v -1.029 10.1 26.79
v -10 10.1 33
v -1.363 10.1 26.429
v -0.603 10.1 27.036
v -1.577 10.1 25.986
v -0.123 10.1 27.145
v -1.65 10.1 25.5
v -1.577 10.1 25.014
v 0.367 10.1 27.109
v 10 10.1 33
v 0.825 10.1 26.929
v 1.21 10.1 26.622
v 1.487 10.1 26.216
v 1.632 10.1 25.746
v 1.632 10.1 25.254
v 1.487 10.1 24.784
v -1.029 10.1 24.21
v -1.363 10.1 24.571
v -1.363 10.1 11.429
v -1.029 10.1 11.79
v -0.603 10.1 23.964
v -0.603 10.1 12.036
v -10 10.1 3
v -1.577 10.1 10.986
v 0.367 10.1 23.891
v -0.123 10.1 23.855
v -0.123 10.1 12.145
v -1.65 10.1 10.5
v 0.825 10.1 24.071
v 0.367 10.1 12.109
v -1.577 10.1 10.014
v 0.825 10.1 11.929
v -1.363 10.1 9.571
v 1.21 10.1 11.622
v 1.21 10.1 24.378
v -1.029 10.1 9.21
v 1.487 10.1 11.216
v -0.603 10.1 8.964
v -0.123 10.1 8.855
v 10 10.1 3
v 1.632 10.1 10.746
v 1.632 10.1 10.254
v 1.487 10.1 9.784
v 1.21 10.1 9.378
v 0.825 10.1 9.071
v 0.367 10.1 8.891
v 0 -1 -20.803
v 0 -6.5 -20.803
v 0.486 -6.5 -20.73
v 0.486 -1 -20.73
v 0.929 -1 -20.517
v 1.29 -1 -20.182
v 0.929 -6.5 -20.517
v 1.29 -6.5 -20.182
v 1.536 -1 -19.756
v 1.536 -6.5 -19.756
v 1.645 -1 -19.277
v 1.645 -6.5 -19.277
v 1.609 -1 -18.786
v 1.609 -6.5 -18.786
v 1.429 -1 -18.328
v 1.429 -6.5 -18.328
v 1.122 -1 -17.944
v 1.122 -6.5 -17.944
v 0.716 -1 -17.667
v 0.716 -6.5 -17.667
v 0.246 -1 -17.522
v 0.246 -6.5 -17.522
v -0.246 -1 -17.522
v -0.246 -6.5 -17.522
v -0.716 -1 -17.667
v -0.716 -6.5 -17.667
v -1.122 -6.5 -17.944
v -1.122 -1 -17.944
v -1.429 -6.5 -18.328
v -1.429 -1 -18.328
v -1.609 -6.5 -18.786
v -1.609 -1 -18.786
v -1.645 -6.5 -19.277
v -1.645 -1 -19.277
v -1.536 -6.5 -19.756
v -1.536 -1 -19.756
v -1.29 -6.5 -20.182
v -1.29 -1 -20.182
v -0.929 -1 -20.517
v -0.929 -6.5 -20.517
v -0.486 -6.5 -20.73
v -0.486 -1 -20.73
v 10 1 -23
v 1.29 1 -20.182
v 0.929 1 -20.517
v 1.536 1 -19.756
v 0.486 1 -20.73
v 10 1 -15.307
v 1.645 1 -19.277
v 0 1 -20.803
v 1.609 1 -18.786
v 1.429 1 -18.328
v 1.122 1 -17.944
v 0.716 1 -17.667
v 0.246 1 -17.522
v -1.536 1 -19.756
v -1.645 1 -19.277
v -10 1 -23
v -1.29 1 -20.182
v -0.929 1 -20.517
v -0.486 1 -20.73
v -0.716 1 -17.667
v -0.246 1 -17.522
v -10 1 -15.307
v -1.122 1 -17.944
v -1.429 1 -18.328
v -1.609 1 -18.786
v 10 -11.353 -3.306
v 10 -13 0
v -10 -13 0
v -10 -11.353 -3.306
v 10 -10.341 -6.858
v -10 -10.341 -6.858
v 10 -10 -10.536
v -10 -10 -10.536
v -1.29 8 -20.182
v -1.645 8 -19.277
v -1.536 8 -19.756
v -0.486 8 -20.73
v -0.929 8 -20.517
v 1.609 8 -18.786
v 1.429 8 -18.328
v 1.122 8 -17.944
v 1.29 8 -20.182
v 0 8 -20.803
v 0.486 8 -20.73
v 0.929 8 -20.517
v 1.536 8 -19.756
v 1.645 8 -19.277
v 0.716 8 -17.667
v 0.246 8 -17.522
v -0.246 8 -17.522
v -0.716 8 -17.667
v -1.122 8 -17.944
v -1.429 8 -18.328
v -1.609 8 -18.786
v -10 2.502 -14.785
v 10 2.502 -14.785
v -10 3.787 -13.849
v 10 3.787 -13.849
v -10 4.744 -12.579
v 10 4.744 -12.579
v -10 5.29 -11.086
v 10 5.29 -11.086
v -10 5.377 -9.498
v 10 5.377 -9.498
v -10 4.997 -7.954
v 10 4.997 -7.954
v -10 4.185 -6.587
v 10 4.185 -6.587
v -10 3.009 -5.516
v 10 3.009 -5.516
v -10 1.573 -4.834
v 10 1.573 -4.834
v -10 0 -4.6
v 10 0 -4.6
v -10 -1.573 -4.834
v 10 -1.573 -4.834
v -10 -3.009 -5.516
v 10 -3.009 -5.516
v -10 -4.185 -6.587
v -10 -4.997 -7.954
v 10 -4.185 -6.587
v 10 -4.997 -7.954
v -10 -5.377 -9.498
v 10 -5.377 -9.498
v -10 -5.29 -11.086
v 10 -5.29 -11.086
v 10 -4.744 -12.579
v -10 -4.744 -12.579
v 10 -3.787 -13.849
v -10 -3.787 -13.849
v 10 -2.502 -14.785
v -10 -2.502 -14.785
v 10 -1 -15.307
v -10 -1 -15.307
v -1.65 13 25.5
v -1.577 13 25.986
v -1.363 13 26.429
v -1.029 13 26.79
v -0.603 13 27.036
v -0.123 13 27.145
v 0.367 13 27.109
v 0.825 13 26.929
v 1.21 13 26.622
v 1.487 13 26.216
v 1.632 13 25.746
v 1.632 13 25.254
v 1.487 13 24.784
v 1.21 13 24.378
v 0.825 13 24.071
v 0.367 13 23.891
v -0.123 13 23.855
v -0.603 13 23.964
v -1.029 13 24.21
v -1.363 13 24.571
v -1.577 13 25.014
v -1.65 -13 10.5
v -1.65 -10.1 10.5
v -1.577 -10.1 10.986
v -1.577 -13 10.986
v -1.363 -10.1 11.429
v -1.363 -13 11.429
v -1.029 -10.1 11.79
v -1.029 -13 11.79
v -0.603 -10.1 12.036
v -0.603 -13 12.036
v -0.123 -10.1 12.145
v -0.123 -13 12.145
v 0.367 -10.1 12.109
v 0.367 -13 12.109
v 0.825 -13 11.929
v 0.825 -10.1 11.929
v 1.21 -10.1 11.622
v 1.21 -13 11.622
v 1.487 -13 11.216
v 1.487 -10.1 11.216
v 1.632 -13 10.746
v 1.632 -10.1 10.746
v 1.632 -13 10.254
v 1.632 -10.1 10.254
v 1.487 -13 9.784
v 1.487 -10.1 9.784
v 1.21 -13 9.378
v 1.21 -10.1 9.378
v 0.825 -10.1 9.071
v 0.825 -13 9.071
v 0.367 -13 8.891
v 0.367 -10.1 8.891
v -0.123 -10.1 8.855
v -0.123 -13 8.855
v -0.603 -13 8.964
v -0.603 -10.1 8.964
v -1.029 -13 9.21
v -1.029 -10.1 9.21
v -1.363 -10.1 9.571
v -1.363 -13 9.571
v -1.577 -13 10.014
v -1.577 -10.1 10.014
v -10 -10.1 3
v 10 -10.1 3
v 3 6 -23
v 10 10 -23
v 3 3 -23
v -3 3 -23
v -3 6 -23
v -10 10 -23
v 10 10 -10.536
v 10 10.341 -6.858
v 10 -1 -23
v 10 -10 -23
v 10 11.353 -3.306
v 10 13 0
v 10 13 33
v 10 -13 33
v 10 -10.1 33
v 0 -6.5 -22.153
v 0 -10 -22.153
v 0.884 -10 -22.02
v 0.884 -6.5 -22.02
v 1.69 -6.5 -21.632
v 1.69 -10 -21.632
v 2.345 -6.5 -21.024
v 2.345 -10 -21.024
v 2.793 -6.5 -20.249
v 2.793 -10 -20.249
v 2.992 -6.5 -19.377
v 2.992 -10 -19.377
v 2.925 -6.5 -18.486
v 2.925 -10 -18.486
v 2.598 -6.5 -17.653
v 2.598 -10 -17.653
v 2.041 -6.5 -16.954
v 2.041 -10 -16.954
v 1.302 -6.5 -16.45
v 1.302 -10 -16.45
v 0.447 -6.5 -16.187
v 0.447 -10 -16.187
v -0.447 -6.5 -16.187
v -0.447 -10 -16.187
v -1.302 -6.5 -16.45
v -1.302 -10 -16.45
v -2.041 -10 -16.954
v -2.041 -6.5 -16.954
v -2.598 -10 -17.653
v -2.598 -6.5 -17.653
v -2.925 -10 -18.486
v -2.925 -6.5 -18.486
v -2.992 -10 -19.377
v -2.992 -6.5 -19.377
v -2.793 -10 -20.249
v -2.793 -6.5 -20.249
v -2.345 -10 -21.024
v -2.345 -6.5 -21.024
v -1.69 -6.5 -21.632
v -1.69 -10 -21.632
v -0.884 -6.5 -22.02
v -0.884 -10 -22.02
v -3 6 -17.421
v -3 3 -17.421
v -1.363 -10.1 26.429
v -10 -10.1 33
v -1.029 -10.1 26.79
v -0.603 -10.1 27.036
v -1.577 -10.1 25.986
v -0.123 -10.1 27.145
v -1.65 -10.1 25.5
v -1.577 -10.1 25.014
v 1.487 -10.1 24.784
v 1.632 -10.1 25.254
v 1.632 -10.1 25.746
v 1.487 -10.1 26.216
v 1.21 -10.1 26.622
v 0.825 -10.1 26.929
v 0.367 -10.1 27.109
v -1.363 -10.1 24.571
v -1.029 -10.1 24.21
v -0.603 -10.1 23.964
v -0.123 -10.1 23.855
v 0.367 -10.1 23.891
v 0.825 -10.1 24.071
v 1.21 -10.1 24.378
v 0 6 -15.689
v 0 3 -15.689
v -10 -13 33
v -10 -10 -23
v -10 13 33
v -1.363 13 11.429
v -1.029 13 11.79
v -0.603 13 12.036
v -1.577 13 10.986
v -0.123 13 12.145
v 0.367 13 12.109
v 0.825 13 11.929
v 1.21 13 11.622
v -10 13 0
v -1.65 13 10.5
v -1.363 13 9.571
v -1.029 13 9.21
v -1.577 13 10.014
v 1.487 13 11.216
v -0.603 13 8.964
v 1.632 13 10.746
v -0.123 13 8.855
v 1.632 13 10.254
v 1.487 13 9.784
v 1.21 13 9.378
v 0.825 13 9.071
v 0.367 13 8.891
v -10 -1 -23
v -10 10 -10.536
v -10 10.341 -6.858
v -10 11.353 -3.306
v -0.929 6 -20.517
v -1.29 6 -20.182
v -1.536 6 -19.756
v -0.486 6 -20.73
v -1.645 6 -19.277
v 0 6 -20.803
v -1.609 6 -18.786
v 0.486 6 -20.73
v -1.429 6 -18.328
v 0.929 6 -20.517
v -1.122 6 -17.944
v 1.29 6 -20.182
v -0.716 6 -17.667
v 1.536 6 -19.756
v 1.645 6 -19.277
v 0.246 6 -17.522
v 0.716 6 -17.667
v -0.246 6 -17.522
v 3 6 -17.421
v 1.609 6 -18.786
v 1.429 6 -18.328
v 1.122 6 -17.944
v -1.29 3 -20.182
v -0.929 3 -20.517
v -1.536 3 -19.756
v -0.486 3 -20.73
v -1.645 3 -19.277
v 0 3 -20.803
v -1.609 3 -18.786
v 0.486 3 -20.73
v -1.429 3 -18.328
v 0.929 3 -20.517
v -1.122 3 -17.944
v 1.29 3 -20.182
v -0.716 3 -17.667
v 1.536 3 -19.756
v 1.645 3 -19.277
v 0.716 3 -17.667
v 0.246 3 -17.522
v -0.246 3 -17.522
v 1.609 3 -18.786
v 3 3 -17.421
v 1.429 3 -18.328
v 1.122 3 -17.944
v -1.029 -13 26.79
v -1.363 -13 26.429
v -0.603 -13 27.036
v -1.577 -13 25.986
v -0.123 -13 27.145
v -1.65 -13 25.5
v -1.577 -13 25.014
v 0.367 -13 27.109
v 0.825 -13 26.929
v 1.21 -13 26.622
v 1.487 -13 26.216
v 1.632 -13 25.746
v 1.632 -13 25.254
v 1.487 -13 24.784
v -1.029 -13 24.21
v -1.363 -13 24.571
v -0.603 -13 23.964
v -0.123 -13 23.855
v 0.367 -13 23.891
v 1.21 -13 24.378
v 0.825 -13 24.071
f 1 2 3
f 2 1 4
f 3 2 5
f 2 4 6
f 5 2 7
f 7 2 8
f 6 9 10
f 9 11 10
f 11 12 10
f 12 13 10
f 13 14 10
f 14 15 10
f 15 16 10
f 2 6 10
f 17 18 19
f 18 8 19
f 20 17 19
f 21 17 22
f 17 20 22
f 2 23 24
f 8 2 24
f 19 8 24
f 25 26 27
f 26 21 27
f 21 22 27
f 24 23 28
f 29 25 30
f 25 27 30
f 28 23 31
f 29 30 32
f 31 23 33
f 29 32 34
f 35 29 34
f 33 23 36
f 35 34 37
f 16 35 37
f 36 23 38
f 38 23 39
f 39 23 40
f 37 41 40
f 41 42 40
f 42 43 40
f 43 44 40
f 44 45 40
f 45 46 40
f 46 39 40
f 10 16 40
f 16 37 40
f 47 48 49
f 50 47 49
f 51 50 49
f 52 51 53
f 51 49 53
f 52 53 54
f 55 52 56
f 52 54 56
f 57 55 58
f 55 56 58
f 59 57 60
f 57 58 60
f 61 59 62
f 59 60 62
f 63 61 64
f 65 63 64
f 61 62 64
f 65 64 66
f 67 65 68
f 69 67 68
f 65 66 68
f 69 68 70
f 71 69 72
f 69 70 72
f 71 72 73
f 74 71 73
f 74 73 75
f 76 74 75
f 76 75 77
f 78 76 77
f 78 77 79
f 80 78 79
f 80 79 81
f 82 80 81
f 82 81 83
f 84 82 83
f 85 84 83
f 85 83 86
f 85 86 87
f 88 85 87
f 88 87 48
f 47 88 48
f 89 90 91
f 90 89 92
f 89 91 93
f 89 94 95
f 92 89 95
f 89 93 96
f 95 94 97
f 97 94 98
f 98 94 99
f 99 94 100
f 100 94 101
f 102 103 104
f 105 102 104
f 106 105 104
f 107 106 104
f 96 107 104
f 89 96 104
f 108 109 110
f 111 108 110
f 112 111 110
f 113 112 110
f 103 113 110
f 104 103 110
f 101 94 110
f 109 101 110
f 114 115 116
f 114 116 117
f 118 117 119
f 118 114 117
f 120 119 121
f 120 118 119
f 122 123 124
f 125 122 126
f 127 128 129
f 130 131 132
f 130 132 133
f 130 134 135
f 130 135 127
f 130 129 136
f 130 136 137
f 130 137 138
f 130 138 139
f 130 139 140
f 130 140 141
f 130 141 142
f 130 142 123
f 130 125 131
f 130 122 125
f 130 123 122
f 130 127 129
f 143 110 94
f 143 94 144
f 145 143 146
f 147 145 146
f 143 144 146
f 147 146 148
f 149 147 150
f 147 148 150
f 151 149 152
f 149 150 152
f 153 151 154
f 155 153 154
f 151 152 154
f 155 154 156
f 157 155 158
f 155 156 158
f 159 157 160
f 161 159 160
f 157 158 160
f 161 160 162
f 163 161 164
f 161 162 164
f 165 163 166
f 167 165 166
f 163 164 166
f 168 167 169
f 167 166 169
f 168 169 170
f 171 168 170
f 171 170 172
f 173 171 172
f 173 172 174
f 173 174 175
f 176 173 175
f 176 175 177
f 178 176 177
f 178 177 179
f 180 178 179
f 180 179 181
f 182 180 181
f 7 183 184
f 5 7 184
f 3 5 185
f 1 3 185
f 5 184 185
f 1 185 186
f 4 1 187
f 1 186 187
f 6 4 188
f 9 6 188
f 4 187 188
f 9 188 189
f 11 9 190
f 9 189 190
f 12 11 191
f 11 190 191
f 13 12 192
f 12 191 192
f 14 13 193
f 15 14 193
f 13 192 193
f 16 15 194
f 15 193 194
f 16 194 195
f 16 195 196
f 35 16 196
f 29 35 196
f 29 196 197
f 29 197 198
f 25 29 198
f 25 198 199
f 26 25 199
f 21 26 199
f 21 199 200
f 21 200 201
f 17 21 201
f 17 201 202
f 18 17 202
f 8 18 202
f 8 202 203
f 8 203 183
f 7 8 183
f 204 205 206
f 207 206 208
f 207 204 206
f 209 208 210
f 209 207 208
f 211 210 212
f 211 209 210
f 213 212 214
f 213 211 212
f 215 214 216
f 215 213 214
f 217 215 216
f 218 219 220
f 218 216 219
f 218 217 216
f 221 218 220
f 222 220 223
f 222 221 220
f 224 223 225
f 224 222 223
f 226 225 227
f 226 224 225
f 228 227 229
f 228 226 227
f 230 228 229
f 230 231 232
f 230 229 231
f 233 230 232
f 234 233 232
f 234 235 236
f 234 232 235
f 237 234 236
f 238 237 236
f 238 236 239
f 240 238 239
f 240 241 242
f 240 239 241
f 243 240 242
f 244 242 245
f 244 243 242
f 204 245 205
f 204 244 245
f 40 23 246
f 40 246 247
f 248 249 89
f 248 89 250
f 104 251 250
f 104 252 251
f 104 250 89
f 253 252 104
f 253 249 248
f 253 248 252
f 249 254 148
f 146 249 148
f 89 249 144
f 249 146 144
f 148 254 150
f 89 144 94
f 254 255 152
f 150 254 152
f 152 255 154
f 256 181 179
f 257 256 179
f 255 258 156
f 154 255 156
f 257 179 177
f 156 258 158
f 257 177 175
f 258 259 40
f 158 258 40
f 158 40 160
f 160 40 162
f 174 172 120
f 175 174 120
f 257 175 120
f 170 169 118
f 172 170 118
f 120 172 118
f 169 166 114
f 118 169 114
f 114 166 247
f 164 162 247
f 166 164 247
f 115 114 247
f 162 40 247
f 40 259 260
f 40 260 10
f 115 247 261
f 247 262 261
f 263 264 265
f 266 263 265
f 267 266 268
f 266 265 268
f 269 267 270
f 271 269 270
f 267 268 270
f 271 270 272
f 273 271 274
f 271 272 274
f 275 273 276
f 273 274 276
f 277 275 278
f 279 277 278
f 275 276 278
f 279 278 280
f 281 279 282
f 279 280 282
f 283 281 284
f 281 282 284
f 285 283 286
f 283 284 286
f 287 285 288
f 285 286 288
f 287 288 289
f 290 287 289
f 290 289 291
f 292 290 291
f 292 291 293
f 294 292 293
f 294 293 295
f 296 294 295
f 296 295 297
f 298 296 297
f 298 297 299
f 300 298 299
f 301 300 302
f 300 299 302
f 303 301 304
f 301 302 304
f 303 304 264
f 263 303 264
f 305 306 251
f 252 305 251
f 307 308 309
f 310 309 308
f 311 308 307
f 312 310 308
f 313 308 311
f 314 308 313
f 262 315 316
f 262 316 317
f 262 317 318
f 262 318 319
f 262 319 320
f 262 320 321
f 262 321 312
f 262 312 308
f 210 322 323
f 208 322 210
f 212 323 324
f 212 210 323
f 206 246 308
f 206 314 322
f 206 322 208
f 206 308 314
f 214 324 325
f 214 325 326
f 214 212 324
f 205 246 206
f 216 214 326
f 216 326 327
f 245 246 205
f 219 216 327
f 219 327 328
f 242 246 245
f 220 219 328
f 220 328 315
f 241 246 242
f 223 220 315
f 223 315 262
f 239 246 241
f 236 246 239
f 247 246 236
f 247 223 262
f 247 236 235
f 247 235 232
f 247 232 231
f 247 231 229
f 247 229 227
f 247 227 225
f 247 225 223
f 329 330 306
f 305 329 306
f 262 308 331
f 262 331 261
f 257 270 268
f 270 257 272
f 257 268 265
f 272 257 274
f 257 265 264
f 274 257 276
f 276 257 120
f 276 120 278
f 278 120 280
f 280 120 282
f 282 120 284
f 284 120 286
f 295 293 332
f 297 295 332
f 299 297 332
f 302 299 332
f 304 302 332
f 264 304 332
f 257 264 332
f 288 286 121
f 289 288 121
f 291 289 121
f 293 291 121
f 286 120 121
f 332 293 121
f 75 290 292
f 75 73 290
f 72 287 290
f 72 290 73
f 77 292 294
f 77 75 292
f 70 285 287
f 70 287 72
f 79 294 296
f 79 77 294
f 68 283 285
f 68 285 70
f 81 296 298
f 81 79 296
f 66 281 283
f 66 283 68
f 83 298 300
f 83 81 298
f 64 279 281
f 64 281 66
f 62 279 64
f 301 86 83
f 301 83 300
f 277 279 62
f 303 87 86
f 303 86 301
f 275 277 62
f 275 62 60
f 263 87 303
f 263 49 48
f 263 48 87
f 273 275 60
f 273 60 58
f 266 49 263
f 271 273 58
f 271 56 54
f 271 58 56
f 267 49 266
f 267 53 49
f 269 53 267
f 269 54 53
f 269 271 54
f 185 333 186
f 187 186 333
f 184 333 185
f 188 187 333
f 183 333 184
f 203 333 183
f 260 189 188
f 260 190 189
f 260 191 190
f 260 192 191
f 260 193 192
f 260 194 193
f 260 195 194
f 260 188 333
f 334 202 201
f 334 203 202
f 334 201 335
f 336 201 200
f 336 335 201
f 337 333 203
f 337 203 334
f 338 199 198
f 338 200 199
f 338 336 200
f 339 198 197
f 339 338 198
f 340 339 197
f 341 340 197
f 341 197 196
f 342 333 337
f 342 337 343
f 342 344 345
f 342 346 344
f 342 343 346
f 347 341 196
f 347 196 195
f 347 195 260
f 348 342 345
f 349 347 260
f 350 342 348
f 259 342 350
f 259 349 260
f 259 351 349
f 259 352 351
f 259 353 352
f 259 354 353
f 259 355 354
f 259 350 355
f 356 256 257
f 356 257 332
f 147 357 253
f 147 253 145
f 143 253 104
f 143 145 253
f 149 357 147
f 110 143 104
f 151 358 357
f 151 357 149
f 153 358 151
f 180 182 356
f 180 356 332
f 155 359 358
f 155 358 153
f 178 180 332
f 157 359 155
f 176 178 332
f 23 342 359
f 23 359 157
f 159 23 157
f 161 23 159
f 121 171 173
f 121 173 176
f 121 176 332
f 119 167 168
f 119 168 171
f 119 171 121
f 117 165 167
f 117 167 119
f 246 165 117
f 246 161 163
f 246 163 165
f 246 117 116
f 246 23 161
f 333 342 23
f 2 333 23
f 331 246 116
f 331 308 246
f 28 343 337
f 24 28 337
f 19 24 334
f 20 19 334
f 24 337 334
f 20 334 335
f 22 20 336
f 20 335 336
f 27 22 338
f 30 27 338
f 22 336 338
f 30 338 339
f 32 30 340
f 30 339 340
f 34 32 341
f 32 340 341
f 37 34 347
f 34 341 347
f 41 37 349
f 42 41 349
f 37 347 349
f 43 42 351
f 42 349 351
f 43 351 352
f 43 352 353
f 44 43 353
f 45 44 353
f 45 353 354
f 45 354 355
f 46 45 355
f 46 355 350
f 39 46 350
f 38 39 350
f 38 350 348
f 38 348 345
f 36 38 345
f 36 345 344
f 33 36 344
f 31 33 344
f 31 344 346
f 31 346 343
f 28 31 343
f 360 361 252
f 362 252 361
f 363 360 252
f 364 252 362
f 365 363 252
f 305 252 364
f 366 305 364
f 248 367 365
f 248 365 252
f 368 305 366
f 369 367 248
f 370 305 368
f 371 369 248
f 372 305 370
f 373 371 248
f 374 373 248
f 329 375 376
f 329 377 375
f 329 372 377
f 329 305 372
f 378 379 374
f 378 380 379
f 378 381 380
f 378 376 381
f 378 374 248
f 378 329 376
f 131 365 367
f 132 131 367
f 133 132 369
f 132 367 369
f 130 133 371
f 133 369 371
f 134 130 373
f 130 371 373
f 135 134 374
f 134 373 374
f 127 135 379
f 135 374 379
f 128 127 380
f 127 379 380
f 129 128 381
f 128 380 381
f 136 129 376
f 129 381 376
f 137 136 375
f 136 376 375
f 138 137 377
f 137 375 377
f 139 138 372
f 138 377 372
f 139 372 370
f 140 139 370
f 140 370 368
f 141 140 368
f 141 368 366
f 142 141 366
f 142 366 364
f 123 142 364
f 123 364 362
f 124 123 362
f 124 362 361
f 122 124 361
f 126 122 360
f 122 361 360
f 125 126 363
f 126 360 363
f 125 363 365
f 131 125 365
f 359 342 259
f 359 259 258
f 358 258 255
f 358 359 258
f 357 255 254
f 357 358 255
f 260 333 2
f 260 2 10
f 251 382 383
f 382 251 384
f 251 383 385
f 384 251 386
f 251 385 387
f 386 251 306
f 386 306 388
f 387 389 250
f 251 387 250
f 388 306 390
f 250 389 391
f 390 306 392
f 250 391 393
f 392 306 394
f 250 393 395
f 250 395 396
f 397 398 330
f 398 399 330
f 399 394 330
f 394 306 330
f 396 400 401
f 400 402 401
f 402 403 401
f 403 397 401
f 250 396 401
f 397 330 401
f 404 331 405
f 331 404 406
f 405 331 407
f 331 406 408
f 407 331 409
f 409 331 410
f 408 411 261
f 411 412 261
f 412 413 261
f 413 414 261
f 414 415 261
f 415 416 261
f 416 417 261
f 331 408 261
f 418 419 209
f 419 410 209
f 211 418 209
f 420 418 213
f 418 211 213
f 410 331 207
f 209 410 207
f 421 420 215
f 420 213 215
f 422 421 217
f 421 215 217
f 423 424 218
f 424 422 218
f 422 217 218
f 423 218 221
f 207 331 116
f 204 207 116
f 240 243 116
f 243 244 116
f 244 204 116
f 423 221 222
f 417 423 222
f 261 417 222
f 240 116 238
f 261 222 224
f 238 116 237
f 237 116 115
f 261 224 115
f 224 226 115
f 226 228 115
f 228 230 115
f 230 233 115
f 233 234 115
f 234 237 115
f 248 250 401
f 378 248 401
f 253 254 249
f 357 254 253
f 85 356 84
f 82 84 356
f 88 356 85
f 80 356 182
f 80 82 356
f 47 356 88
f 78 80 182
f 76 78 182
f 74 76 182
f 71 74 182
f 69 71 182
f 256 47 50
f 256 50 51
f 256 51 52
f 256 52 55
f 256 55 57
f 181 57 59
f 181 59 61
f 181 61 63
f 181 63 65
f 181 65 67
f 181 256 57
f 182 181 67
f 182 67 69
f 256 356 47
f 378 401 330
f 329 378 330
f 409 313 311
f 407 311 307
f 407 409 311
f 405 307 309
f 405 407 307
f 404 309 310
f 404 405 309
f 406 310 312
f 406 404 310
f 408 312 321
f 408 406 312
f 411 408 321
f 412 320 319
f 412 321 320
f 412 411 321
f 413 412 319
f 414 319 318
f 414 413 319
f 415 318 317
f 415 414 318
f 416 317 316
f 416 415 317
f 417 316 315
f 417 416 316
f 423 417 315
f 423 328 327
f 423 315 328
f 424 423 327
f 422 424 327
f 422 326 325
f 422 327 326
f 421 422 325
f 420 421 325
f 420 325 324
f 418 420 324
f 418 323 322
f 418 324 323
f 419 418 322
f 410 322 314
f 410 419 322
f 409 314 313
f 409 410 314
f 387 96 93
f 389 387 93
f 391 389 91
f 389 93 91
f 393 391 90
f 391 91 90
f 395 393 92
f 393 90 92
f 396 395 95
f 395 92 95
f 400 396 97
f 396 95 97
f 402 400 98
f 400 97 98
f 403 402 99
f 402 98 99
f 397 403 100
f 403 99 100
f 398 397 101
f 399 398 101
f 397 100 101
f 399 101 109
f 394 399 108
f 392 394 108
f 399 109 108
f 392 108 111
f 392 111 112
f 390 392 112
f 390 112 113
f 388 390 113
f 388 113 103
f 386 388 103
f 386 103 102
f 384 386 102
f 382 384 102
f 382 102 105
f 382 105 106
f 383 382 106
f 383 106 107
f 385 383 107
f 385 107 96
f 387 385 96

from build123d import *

# Parameters (mm, degrees)
SKETCH_2_W          = 20
SKETCH_2_H          = 26
EXTRUDE_1_DEPTH     = 3
SKETCH_3_W          = 20
SKETCH_3_H          = 2.9
EXTRUDE_2_DEPTH     = 30
SKETCH_4_R          = 1.65
CUT_EXTRUDE_1_DEPTH = 23.1
SKETCH_5_W          = 20
SKETCH_5_H          = 20
EXTRUDE_3_DEPTH     = 20
SKETCH_6_R          = 5.4
CUT_EXTRUDE_2_DEPTH = 20
CUT_EXTRUDE_3_DEPTH = 20
SKETCH_8_W          = 20
SKETCH_8_H          = 9
EXTRUDE_4_DEPTH     = 3
SKETCH_9_R          = 1.65
CUT_EXTRUDE_4_DEPTH = 16
SKETCH_10_R         = 3
CUT_EXTRUDE_5_DEPTH = 3.5
CUT_EXTRUDE_START   = -2
CUT_EXTRUDE_6_DEPTH = 3
SKETCH_12_R         = 1.65
CUT_EXTRUDE_7_DEPTH = 2
FILLET_1_R          = 20


with BuildPart() as part:
    # Эскиз2 → Бобышка-Вытянуть1 (new body)
    with BuildSketch(Plane.XY):
        Rectangle(SKETCH_2_W, SKETCH_2_H)
    extrude(amount=EXTRUDE_1_DEPTH)

    # Эскиз3 → Бобышка-Вытянуть2 (add)
    with BuildSketch(Plane.XY.offset(3)):
        with Locations((0, 11.55)):
            Rectangle(SKETCH_3_W, SKETCH_3_H)
        with Locations((0, -11.55)):
            Rectangle(SKETCH_3_W, SKETCH_3_H)
    extrude(amount=EXTRUDE_2_DEPTH)

    # Эскиз4 → Вырез-Вытянуть1 (cut)
    with BuildSketch(Plane(origin=(0, 13, 0), x_dir=(1, 0, 0), z_dir=(0, 1, 0))):
        with Locations(Location((0, -10.5, 0), (0, 0, 180))):
            Circle(SKETCH_4_R)
        with Locations(Location((0, -25.5, 0), (0, 0, 180))):
            Circle(SKETCH_4_R)
    cut_extrude_1 = extrude(amount=-CUT_EXTRUDE_1_DEPTH, mode=Mode.SUBTRACT)

    # Зеркальное отражение1: Вырез-Вытянуть1 across plane
    add(cut_extrude_1.mirror(Plane.ZX), mode=Mode.SUBTRACT)

    # Эскиз5 → Бобышка-Вытянуть3 (add)
    with BuildSketch(Plane(origin=(0, 0, 0), x_dir=(-1, 0, 0), z_dir=(0, 0, -1))):
        Rectangle(SKETCH_5_W, SKETCH_5_H)
    extrude(amount=EXTRUDE_3_DEPTH)

    # Эскиз6 → Вырез-Вытянуть2 (cut)
    with BuildSketch(Plane(origin=(10, 0, 0), x_dir=(0, 0, -1), z_dir=(1, 0, 0))):
        with Locations(Location((10, 0, 0), (0, 0, 90))):
            Circle(SKETCH_6_R)
    extrude(amount=-CUT_EXTRUDE_2_DEPTH, mode=Mode.SUBTRACT)

    # Эскиз7 → Вырез-Вытянуть3 (cut)
    with BuildSketch(Plane(origin=(10, 0, 0), x_dir=(0, 0, -1), z_dir=(1, 0, 0))):
        with BuildLine():
            Line((15.306599665, 1), (20, 1))
            Line((20, 1), (20, -1))
            Line((20, -1), (15.306599665, -1))
            ThreePointArc((15.306599665, -1), (15.4, 0), (15.306599665, 1))
        make_face()
    extrude(amount=-CUT_EXTRUDE_3_DEPTH, mode=Mode.SUBTRACT)

    # Эскиз8 → Бобышка-Вытянуть4 (add)
    with BuildSketch(Plane(origin=(0, 0, -20), x_dir=(-1, 0, 0), z_dir=(0, 0, -1))):
        with Locations((0, 5.5)):
            Rectangle(SKETCH_8_W, SKETCH_8_H)
        with Locations((0, -5.5)):
            Rectangle(SKETCH_8_W, SKETCH_8_H)
    extrude(amount=EXTRUDE_4_DEPTH)

    # Эскиз9 → Вырез-Вытянуть4 (cut)
    with BuildSketch(Plane.XZ.offset(10)):
        with Locations(Location((0, -19.153299832, 0), (0, 0, 270))):
            Circle(SKETCH_9_R)
    extrude(amount=-CUT_EXTRUDE_4_DEPTH, mode=Mode.SUBTRACT)

    # Эскиз10 → Вырез-Вытянуть5 (cut)
    with BuildSketch(Plane.XZ.offset(10)):
        with Locations(Location((0, -19.153299832, 0), (0, 0, 270))):
            Circle(SKETCH_10_R)
    extrude(amount=-CUT_EXTRUDE_5_DEPTH, mode=Mode.SUBTRACT)

    # Эскиз11 → Вырез-Вытянуть6 (cut)
    with BuildSketch(Plane.XZ.offset(-1).offset(CUT_EXTRUDE_START)):
        Polygon((3, -23), (3, -17.421249025), (0, -15.689198217), (-3, -17.421249025), (-3, -23), align=None)
    extrude(amount=-CUT_EXTRUDE_6_DEPTH, mode=Mode.SUBTRACT)

    # Эскиз12 → Вырез-Вытянуть7 (cut)
    with BuildSketch(Plane.XZ.offset(-6)):
        with Locations(Location((0, -19.153299832, 0), (0, 0, 270))):
            Circle(SKETCH_12_R)
    extrude(amount=-CUT_EXTRUDE_7_DEPTH, mode=Mode.SUBTRACT)

    # Скругление1
    # the kernel refuses this fillet: 20 mm, written as the material it adds along each edge
    with BuildSketch(Plane(origin=(10, -10, 0), x_dir=(0, 0, -1), z_dir=(-1, 0, 0))) as fillet_1_piece_1:
        with BuildLine():
            CenterArc((10.535653753, 20), FILLET_1_R, 238.211669383, 31.788330617)
            Line((0, 3), (0, 0))
            Line((0, 0), (10.535653753, 0))
        make_face()
    extrude(amount=20)
    with BuildSketch(Plane(origin=(-10, 10, 0), x_dir=(0, 1, 0), z_dir=(1, 0, 0))) as fillet_1_piece_2:
        with BuildLine():
            CenterArc((20, -10.535653753), FILLET_1_R, 148.211669383, 31.788330617)
            Line((0, -10.535653753), (0, 0))
            Line((0, 0), (3, 0))
        make_face()
    extrude(amount=20)


solid = part.part
